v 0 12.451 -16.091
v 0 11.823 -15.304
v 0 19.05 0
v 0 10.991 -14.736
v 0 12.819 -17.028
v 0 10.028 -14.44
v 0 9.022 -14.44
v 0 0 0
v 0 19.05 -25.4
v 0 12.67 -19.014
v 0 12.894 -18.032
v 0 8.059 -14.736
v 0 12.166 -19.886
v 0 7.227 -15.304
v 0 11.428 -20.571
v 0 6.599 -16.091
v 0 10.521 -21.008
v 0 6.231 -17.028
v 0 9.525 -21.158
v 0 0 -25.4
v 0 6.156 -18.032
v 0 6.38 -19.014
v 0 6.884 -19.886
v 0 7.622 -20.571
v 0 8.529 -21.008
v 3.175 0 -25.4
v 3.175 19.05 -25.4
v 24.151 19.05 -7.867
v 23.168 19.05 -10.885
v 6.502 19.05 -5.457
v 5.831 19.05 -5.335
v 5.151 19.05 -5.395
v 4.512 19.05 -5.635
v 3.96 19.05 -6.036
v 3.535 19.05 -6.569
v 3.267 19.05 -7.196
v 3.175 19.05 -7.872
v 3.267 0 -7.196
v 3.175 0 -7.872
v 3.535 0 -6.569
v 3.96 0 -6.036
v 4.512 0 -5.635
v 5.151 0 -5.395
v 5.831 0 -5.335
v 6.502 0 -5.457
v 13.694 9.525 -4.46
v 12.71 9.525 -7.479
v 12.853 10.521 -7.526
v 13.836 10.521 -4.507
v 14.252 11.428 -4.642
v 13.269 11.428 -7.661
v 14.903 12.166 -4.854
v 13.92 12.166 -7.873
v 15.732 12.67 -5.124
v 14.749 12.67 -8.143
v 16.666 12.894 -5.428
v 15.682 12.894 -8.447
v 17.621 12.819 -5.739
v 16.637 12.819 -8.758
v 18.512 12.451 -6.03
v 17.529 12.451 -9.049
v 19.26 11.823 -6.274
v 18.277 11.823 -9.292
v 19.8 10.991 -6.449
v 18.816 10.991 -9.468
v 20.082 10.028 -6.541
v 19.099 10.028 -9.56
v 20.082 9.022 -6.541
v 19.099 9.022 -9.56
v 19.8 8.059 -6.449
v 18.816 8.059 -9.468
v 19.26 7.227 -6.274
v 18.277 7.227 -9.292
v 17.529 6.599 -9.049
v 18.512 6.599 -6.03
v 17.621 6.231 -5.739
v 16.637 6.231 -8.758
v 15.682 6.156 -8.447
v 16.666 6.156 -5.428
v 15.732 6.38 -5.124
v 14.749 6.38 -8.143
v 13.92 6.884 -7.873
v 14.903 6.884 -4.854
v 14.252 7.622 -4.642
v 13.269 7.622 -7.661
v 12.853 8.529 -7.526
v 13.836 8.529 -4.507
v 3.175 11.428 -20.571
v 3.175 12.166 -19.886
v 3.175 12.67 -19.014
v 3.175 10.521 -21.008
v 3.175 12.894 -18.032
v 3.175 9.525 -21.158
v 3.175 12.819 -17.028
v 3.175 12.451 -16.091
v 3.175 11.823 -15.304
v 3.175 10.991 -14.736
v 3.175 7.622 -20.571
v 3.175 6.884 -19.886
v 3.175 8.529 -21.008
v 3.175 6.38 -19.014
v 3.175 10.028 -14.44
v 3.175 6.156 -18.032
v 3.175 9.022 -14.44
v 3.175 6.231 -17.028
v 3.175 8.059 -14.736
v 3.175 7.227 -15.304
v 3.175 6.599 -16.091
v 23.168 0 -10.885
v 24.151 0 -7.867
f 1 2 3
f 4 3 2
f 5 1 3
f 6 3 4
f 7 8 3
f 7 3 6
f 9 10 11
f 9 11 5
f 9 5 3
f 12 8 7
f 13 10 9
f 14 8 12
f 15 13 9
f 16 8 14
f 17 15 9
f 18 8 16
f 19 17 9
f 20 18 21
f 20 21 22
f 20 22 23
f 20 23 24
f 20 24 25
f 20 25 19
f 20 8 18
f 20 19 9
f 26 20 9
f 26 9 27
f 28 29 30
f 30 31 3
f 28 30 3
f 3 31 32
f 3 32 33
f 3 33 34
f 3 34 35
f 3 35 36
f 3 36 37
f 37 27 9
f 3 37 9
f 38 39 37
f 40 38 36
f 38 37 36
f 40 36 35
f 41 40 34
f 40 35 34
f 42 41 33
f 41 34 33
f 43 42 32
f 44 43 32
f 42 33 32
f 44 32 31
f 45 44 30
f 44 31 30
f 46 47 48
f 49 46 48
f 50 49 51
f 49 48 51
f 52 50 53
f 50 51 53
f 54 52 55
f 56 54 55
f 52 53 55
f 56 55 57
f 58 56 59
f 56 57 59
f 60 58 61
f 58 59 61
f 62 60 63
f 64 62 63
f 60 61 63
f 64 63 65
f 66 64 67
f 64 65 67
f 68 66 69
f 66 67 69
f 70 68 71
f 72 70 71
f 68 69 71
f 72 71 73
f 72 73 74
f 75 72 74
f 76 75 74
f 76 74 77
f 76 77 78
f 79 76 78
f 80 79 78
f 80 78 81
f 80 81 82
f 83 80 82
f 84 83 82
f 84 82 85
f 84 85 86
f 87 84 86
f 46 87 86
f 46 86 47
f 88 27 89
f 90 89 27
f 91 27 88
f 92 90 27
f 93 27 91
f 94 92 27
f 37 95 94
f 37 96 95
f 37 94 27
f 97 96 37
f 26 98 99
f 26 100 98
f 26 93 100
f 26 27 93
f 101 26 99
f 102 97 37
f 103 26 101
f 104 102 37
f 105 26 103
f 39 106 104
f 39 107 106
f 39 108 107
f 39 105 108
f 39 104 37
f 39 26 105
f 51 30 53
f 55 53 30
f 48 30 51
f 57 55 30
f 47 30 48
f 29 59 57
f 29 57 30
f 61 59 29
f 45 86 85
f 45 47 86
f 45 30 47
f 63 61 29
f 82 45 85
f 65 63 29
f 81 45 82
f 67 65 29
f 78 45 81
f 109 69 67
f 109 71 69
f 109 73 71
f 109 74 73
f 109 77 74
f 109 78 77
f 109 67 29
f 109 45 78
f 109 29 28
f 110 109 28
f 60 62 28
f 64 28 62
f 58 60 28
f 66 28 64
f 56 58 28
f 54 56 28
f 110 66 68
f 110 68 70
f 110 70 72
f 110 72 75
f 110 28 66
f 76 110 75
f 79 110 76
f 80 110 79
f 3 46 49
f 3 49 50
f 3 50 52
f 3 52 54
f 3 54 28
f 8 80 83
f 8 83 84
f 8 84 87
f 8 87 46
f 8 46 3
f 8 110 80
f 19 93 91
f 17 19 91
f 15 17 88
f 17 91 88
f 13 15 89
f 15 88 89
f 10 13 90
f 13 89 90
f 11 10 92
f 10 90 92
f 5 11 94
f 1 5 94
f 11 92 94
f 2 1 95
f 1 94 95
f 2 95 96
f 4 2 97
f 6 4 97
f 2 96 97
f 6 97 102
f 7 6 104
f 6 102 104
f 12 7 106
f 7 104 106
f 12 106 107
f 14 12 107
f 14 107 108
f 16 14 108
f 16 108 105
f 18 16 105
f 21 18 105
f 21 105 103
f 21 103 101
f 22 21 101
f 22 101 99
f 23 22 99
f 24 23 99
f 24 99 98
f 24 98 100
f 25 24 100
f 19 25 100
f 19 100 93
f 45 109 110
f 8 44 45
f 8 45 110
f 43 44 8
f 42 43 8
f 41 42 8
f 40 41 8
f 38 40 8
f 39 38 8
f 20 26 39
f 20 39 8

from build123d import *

# Parameters (mm, degrees)
BOSS_EXTRUDE1_DEPTH     = 19.05
FILLET1_R               = 2.54
F_1_4_CLEARANCE_HOLE1_D = 6.7564
F_1_4_CLEARANCE_HOLE2_D = 6.7564


with BuildPart() as part:
    # Sketch1 → Boss-Extrude1 (new body)
    with BuildSketch(Plane(origin=(0, 0, 0), x_dir=(1, 0, 0), z_dir=(0, 1, 0))):
        Polygon((0, 0), (0, 25.4), (3.175, 25.4), (3.175, 4.373344438), (23.167823374, 10.885429945), (24.151140547, 7.866537377), align=None)
    extrude(amount=BOSS_EXTRUDE1_DEPTH)

    # Fillet1
    fillet1_edges = [part.edges().sort_by_distance(p)[0] for p in [
        (3.175, 9.525, -4.373344438),
    ]]
    fillet(fillet1_edges, radius=FILLET1_R)

    # 1/4 Clearance Hole1 (through all)
    with Locations(Plane.ZY):
        with Locations((-17.78, 9.525)):
            Hole(F_1_4_CLEARANCE_HOLE1_D / 2)

    # 1/4 Clearance Hole2 (through all)
    with Locations(Plane(origin=(0, 0, 0), x_dir=(0.9508323049826902, 0, -0.30970619593625254), z_dir=(0.30970619593625254, 0, 0.9508323049826902))):
        with Locations((17.78, 9.525)):
            Hole(F_1_4_CLEARANCE_HOLE2_D / 2)


solid = part.part
